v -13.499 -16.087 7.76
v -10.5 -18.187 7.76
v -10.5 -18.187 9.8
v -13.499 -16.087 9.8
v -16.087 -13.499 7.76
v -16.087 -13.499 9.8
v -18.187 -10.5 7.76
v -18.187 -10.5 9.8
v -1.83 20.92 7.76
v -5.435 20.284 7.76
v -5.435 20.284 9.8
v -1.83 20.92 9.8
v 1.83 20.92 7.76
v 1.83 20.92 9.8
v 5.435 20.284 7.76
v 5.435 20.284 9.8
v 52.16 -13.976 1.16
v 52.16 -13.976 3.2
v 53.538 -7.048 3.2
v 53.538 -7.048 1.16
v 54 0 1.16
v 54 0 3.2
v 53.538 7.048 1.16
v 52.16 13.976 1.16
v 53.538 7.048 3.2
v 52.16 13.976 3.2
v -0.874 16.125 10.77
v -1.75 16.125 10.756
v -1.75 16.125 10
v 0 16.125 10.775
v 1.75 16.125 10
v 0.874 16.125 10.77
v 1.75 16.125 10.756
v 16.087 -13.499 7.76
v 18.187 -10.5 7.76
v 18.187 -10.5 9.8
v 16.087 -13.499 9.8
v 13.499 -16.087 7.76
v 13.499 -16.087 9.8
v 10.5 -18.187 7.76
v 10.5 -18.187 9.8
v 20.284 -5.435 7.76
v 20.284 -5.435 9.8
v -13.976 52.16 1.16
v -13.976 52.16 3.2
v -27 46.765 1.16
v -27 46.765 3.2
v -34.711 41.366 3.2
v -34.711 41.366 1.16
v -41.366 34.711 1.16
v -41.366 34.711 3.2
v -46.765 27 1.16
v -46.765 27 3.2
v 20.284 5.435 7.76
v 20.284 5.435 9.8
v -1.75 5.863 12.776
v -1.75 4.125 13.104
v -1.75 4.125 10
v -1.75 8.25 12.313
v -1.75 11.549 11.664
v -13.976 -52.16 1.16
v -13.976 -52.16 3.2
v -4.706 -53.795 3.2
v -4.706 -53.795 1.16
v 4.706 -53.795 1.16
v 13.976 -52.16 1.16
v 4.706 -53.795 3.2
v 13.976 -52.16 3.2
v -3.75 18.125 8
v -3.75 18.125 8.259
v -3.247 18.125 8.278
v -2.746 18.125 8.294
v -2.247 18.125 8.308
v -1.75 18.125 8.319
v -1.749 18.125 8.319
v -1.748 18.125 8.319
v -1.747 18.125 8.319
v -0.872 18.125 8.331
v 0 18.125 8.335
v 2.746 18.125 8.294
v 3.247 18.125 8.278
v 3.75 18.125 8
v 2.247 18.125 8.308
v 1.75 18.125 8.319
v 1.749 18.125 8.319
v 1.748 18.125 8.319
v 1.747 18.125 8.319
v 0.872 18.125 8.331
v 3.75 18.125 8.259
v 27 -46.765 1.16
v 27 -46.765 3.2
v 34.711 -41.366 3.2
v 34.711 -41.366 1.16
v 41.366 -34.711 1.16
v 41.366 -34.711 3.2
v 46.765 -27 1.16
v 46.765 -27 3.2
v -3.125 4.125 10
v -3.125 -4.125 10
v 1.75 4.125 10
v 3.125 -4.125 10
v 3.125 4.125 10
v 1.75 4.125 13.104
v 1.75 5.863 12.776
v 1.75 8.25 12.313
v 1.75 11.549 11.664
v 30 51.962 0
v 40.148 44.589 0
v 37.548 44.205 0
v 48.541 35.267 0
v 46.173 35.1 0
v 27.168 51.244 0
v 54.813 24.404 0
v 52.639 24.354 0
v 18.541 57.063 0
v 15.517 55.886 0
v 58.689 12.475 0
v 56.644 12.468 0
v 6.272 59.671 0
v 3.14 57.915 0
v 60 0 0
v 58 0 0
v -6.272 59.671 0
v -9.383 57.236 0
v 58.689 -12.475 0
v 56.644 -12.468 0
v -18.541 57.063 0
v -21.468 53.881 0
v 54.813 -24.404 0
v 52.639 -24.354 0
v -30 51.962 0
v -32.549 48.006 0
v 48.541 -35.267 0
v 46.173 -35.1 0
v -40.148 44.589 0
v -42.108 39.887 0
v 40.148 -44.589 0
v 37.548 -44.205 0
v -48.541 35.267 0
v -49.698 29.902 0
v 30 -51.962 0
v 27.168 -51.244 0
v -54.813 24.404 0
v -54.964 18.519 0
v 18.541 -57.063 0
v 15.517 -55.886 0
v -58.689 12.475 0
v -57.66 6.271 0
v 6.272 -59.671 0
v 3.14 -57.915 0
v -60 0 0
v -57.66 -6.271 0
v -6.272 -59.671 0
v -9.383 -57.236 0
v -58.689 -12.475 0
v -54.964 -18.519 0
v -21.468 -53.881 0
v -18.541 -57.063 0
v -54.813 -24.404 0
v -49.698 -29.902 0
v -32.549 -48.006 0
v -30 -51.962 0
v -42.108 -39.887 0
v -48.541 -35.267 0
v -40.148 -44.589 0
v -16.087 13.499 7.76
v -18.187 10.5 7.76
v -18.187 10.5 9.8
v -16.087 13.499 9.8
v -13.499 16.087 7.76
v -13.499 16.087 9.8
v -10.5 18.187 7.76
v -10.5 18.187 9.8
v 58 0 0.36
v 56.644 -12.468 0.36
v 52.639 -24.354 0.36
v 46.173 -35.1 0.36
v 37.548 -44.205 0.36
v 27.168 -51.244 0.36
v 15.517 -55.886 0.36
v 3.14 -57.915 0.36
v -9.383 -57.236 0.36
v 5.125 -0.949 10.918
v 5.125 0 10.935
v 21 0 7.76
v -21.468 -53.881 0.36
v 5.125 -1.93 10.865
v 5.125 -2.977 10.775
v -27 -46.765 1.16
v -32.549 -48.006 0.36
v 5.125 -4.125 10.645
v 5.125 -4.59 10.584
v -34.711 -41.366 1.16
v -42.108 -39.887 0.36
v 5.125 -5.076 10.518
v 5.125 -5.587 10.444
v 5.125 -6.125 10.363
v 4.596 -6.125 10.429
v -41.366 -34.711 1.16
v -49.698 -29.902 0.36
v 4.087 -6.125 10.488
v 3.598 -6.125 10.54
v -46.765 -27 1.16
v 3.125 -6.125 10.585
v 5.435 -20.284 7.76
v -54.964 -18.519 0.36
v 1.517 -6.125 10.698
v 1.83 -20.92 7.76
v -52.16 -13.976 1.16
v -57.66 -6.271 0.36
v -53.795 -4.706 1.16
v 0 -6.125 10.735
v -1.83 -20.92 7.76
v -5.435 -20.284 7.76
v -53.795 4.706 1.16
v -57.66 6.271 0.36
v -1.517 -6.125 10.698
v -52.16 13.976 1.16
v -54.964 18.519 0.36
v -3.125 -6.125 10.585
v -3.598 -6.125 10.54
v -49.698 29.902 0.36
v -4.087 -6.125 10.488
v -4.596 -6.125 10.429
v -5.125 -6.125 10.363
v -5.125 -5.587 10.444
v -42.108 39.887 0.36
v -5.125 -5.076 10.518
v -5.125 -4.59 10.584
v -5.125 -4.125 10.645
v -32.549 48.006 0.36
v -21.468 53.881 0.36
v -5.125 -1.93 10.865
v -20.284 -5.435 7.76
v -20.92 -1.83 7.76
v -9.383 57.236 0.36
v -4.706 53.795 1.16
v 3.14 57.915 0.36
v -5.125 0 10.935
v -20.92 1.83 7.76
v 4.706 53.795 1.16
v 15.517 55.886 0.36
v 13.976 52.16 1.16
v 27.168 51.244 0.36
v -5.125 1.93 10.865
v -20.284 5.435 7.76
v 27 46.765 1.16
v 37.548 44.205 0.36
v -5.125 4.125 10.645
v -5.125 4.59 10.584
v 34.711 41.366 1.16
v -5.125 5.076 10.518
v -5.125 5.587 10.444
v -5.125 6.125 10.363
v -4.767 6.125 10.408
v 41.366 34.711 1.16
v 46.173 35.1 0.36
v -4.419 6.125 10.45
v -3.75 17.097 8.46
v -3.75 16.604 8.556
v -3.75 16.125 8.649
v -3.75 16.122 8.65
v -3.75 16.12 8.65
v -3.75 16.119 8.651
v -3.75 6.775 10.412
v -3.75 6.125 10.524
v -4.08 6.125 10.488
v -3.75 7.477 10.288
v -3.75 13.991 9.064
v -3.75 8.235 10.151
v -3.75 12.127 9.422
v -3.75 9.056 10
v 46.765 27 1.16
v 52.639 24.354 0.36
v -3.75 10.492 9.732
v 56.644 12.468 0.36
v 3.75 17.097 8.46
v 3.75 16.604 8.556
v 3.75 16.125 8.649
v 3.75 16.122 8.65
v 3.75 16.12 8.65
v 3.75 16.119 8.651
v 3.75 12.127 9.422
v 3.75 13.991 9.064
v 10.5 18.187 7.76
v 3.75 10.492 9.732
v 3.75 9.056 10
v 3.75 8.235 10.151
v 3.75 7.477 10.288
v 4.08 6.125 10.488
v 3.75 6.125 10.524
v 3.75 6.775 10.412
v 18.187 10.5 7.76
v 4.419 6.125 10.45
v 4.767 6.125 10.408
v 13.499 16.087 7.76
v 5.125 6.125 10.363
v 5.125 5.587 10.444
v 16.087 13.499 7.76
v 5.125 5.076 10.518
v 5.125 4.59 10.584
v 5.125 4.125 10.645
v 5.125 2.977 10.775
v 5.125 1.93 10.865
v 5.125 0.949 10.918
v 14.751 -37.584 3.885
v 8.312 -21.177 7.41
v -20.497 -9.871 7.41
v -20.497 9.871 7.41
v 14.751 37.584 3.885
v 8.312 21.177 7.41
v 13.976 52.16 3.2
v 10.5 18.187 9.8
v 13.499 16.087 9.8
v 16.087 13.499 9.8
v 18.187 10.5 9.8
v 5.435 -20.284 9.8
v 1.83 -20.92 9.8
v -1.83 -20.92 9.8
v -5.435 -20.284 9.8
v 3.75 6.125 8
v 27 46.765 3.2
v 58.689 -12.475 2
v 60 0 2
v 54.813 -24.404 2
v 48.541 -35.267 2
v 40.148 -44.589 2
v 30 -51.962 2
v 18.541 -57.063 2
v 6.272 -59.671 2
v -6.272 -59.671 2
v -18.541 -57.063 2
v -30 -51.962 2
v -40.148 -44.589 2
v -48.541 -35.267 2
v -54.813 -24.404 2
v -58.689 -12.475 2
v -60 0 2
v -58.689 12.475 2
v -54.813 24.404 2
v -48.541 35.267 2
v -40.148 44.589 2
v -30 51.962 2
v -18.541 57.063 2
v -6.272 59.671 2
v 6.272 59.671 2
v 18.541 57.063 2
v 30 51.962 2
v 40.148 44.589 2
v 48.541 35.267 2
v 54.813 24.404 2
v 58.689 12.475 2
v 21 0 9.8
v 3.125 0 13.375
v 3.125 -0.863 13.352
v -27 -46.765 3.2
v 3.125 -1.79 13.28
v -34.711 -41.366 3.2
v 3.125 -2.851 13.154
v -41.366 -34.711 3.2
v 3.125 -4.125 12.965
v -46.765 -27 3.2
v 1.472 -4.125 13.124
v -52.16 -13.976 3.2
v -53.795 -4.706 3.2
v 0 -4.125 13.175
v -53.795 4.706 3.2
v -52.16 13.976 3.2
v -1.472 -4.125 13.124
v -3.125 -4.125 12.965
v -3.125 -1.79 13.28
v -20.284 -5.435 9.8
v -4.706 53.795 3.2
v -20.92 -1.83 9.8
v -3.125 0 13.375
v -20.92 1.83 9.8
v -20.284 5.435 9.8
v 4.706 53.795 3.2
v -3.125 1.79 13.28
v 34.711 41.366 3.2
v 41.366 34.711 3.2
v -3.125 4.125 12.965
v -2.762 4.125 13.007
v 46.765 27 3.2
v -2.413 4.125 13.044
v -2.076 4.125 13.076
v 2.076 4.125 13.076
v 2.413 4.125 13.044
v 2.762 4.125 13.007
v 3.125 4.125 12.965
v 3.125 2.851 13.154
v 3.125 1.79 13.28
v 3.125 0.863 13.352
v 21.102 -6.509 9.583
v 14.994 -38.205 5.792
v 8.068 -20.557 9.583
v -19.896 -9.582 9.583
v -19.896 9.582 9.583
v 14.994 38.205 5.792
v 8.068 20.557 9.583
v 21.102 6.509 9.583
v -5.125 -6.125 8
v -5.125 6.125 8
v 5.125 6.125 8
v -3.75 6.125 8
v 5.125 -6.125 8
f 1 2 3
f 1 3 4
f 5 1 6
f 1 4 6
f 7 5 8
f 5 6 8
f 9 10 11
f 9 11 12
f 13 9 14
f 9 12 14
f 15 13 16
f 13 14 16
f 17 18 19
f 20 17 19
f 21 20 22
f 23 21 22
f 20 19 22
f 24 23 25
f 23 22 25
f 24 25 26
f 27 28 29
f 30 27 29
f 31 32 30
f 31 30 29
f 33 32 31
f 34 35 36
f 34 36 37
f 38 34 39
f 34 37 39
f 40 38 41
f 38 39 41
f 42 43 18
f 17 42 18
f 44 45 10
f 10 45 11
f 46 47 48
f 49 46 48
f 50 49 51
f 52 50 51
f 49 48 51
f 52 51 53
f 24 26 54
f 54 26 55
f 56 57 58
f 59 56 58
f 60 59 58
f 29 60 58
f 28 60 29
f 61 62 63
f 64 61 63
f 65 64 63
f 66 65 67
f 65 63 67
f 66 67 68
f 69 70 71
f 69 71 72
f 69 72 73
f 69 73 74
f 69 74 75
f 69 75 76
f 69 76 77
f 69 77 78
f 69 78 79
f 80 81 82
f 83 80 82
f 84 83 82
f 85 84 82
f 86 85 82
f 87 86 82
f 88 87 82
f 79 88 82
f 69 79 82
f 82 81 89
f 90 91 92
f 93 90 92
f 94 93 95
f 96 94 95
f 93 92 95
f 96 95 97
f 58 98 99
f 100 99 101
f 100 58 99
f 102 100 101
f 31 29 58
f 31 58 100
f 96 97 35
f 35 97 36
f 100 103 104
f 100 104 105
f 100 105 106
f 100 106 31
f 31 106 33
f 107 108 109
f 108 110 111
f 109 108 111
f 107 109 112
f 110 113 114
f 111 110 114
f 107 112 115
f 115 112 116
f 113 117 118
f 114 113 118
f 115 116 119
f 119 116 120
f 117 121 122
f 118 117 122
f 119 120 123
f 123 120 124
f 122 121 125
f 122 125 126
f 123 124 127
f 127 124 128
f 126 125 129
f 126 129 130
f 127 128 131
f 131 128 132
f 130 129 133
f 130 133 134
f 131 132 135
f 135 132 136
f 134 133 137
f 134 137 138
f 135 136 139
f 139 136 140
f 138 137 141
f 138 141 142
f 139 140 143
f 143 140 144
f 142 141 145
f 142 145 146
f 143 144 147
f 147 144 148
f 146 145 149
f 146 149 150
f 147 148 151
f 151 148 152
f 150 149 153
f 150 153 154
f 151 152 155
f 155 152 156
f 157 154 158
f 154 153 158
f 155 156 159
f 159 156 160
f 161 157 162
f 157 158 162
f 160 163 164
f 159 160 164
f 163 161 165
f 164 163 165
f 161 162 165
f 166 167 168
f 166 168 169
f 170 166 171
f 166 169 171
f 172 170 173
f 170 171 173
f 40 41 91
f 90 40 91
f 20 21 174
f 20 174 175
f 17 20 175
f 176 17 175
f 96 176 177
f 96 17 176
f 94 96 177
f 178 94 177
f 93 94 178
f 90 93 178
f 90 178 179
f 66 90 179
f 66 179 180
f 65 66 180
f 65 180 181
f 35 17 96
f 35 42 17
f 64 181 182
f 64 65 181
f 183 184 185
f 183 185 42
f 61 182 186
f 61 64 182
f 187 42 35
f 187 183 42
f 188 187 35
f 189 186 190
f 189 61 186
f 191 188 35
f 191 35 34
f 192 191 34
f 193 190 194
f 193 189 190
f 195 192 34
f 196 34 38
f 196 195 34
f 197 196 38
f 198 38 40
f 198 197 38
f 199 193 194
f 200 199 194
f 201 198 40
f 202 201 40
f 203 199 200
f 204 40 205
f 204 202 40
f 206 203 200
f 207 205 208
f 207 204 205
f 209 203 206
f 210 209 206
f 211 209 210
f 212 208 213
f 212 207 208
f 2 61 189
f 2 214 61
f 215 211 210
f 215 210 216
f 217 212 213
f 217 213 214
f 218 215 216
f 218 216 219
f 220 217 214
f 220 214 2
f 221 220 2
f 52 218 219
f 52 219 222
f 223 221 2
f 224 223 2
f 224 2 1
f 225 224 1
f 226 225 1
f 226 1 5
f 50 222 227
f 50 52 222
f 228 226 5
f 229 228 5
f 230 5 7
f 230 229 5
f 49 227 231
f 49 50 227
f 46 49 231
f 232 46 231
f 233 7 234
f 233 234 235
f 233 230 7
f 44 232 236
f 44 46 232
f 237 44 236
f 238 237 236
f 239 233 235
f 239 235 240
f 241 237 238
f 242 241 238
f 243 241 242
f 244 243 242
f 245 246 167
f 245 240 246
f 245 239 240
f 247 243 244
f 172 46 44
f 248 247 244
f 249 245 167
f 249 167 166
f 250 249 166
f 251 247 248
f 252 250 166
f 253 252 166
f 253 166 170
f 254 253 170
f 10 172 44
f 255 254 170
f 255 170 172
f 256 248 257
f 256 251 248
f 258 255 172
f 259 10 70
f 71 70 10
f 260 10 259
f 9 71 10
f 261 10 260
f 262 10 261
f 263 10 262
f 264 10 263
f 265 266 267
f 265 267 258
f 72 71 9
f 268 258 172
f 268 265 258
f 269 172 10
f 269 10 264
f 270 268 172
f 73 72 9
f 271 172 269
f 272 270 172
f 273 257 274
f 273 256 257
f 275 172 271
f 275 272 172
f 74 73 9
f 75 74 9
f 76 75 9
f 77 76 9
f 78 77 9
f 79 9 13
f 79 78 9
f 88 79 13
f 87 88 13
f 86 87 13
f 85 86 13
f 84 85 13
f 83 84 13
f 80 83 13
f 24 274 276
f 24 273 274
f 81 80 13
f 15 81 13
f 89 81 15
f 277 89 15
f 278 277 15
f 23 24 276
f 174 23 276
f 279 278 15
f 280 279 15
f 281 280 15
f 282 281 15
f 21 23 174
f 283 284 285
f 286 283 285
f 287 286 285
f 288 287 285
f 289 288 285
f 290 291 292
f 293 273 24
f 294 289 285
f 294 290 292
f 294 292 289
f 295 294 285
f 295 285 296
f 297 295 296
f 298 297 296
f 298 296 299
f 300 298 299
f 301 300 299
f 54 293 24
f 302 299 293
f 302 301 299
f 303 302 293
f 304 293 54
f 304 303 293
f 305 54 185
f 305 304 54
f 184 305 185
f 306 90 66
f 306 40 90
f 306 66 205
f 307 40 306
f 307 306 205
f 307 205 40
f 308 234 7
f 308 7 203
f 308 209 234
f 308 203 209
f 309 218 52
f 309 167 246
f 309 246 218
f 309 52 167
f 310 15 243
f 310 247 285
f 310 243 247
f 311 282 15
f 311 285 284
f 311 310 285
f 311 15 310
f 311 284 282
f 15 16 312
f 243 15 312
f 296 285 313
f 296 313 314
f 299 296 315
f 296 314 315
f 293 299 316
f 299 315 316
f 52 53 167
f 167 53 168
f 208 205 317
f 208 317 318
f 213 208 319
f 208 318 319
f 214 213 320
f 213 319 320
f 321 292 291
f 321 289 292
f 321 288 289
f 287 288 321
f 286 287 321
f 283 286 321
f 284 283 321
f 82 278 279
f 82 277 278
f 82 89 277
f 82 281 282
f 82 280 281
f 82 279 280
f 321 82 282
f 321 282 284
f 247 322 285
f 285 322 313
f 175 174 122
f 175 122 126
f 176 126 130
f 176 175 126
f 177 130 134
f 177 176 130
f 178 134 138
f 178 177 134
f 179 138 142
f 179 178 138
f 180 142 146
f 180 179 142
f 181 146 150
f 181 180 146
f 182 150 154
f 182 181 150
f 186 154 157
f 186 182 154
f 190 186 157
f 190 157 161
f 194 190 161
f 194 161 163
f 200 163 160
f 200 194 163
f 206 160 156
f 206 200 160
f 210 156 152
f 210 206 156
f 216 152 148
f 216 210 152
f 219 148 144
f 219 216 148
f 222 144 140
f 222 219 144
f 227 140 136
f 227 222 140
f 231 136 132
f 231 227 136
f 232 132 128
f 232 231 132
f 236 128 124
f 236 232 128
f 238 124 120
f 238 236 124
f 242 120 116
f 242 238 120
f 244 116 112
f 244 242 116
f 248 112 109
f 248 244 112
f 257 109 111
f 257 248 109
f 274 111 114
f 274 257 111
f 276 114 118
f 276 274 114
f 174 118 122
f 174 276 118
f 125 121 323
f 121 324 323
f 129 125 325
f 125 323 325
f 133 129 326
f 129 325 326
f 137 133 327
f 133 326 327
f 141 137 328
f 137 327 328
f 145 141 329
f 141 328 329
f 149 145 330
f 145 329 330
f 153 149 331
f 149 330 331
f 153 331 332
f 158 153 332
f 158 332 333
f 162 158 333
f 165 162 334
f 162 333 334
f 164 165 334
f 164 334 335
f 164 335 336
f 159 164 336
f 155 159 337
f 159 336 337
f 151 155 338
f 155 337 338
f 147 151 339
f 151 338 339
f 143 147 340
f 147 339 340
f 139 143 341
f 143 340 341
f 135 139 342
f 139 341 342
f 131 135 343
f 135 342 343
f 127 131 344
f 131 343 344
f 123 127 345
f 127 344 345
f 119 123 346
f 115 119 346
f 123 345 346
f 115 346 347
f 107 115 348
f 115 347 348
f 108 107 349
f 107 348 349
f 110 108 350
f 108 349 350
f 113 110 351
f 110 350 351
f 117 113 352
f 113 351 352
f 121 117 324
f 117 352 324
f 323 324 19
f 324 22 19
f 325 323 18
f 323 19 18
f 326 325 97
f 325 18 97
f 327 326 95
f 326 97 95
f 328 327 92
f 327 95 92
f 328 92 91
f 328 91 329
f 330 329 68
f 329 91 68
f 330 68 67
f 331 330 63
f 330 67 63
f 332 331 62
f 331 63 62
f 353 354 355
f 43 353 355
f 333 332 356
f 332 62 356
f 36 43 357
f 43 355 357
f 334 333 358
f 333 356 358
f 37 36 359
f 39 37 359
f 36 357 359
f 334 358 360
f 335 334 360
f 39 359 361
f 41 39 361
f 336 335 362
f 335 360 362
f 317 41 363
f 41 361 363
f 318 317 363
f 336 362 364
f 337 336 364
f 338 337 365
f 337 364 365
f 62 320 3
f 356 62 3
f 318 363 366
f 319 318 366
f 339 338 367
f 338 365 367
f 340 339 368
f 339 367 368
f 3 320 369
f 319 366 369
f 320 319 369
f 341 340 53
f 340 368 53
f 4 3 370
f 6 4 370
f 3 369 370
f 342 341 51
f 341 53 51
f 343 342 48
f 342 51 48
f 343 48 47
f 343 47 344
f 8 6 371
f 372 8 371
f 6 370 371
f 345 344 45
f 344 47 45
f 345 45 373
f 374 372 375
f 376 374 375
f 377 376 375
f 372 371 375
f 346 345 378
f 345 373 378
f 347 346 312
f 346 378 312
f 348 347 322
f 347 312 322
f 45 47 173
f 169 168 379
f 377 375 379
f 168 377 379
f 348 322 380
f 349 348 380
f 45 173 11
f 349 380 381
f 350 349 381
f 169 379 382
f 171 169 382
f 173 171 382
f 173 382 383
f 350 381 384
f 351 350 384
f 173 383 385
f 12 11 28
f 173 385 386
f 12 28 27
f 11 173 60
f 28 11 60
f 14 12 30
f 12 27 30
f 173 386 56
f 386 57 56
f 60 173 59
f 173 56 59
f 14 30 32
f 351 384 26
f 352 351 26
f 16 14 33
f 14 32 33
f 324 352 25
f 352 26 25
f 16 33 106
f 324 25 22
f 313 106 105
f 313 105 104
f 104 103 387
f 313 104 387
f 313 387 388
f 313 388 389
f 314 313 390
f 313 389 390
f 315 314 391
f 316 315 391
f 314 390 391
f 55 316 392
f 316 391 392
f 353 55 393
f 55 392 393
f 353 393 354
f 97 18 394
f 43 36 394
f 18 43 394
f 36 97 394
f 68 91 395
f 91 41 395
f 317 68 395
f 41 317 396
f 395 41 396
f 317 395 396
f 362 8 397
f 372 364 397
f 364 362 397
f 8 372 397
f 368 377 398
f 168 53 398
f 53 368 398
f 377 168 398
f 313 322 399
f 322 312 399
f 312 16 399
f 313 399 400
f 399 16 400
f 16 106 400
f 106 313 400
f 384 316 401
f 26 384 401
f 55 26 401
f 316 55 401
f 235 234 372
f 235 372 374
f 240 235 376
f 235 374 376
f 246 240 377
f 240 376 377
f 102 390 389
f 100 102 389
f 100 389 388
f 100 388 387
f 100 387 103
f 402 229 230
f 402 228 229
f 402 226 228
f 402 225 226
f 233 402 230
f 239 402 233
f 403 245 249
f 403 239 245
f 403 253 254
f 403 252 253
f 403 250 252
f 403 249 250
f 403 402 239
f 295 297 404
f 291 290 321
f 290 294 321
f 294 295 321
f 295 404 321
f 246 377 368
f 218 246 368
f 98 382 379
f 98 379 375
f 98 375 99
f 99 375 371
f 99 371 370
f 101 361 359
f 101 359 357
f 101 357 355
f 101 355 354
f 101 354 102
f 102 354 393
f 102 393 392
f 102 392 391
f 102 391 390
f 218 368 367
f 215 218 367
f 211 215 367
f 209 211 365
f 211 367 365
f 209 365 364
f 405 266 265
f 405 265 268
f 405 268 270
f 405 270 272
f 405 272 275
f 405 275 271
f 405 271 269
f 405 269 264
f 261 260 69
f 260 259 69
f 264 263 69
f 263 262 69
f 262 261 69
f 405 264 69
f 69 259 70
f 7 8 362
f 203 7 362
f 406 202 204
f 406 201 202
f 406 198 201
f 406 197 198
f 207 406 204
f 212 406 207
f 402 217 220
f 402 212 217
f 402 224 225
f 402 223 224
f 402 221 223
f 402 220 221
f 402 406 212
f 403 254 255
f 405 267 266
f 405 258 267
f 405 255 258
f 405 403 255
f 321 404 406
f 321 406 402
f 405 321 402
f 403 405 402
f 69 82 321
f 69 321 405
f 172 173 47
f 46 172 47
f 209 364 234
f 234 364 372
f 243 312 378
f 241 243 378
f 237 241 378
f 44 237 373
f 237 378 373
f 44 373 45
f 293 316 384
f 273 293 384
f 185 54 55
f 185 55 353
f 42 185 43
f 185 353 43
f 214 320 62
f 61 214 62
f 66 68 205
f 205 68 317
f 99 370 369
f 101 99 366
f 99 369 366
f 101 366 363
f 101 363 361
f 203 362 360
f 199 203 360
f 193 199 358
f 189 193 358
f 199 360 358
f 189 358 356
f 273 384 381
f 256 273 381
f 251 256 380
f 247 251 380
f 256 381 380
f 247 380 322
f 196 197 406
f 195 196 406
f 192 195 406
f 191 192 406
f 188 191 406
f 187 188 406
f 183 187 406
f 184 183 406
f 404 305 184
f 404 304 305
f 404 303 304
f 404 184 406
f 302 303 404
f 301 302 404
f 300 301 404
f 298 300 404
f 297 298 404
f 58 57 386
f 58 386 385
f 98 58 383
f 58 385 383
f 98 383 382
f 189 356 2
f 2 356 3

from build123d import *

# Parameters (mm, degrees)
F3_W         = 3.5
F3_H         = 12
F4_DEPTH     = 4
F5_T         = 2
F5_T3_DEPTH  = 6.9649879228
F5_T5_DEPTH  = 12.25
F5_T7_DEPTH  = 10.25
F5_T9_DEPTH  = 5.375
F5_T11_DEPTH = 16
F5_T13_DEPTH = 4.7560633483
F5_T15_DEPTH = 7.5
F5_T17_DEPTH = 5.375
F7_DEPTH     = 25


# Not quite as in the source:
# - a shell that OpenCascade refuses in one call is made with other operations: the cavity is built on its own and cut out


with BuildPart() as f1:
    # F0 (on Front) → F1 (revolve)
    with BuildSketch(Plane.XZ):
        Polygon((60, 2), (0, 14), (0, 0), (60, 0), align=None)
    revolve(axis=Axis((0, 0, 7), (0, 0, -1)))

    # F3 (on offset) → F4 (cut)
    with BuildSketch(Plane.XY.offset(14)):
        Polygon((3.125, -4.125), (3.125, 4.125), (1.75, 4.125), (-1.75, 4.125), (-3.125, 4.125), (-3.125, -4.125), align=None)
        with Locations((0, 10.125)):
            Rectangle(F3_W, F3_H)
    extrude(amount=-F4_DEPTH, mode=Mode.SUBTRACT)

    # F5: shell of thickness 2, made by hand


with BuildPart() as f5_core1:
    # F5_t2: copy of F1
    add(f1.part)

    # the walls: a layer under each face that stays
    f5_faces = [f5_core1.faces().sort_by_distance(p)[0] for p in [
        (-31.5412459886, 0, 7.6917508023),
        (3.125, 0, 11.6875),
        (0, -4.125, 11.5875),
        (-3.125, 0, 11.6875),
        (-2.4375, 4.125, 11.5519137918),
        (-1.75, 10.125, 11.5519137918),
        (0, 16.125, 10.3875),
        (1.75, 10.125, 11.5519137918),
        (2.4375, 4.125, 11.5519137918),
        (-60, 0, 1),
        (0, 6, 10),
    ]]
    thicken(f5_faces, amount=-F5_T, mode=Mode.SUBTRACT)

    # F5_s4 → F5_t3 (cut)
    with BuildSketch(Plane.XY.offset(8)):
        Polygon((3.105, 4.105), (5.125, 4.125), (5.125, 6.125), (3.125, 6.125), align=None)
        Polygon((3.105, -4.105), (5.125, -4.125), (5.125, -6.125), (3.125, -6.125), align=None)
        Polygon((-3.105, -4.105), (-3.125, -6.125), (-5.125, -6.125), (-5.125, -4.125), align=None)
        Polygon((-3.105, 4.105), (-5.125, 4.125), (-5.125, 6.125), (-3.125, 6.125), align=None)
    extrude(amount=F5_T3_DEPTH, mode=Mode.SUBTRACT)

    # F5_s6 → F5_t5 (cut)
    with BuildSketch(Plane.XZ.offset(-6.125)):
        Polygon((3.105, 10.02), (5.125, 10), (5.125, 8), (3.125, 8), align=None)
        Polygon((-3.105, 10.02), (-5.125, 10), (-5.125, 8), (-3.125, 8), align=None)
    extrude(amount=F5_T5_DEPTH, mode=Mode.SUBTRACT)

    # F5_s8 → F5_t7 (cut)
    with BuildSketch(Plane.YZ.offset(-5.125)):
        Polygon((-4.105, 10.02), (-6.125, 10), (-6.125, 8), (-4.125, 8), align=None)
    extrude(amount=F5_T7_DEPTH, mode=Mode.SUBTRACT)

    # F5_s10 → F5_t9 (cut)
    with BuildSketch(Plane.YZ.offset(-5.125)):
        Polygon((4.105, 10.02), (6.125, 10), (6.125, 8), (4.125, 8), align=None)
    extrude(amount=F5_T9_DEPTH, mode=Mode.SUBTRACT)

    # F5_s12 → F5_t11 (cut)
    with BuildSketch(Plane.XZ.offset(-18.125)):
        Polygon((-1.73, 10.02), (-3.75, 10), (-3.75, 8), (-1.75, 8), align=None)
        Polygon((1.73, 10.02), (3.75, 10), (3.75, 8), (1.75, 8), align=None)
    extrude(amount=F5_T11_DEPTH, mode=Mode.SUBTRACT)

    # F5_s14 → F5_t13 (cut)
    with BuildSketch(Plane.XY.offset(8)):
        Polygon((-1.73, 16.105), (-3.75, 16.125), (-3.75, 18.125), (-1.75, 18.125), align=None)
        Polygon((1.73, 16.105), (1.75, 18.125), (3.75, 18.125), (3.75, 16.125), align=None)
    extrude(amount=F5_T13_DEPTH, mode=Mode.SUBTRACT)

    # F5_s16 → F5_t15 (cut)
    with BuildSketch(Plane.YZ.offset(-3.75)):
        Polygon((16.105, 10.02), (18.125, 10), (18.125, 8), (16.125, 8), align=None)
    extrude(amount=F5_T15_DEPTH, mode=Mode.SUBTRACT)

    # F5_s18 → F5_t17 (cut)
    with BuildSketch(Plane.YZ.offset(-0.25)):
        Polygon((4.105, 10.02), (6.125, 10), (6.125, 8), (4.125, 8), align=None)
    extrude(amount=F5_T17_DEPTH, mode=Mode.SUBTRACT)


with BuildPart() as f1_1:
    add(f1.part)

    # what is left inside the walls is the cavity
    f5_cavity = [f5_core1.part.solids().sort_by_distance(p)[0] for p in [
        (0, 19.333333, 0.02),
    ]]
    add(f5_cavity, mode=Mode.SUBTRACT)

    # F6 (on offset) → F7 (cut)
    with BuildSketch(Plane.XY.offset(14)):
        with BuildLine():
            ThreePointArc((5.4351999472, -20.2844423521), (0, -21), (-5.4351999472, -20.2844423521))
            Line((-5.4351999472, -20.2844423521), (-13.9762284355, -52.1599946196))
            ThreePointArc((-13.9762284355, -52.1599946196), (0, -54), (13.9762284355, -52.1599946196))
            Line((13.9762284355, -52.1599946196), (5.4351999472, -20.2844423521))
        make_face()
        with BuildLine():
            ThreePointArc((18.1865334795, -10.5), (14.8492424049, -14.8492424049), (10.5, -18.1865334795))
            Line((10.5, -18.1865334795), (27, -46.7653718044))
            ThreePointArc((27, -46.7653718044), (38.1837661841, -38.1837661841), (46.7653718044, -27))
            Line((46.7653718044, -27), (18.1865334795, -10.5))
        make_face()
        with BuildLine():
            ThreePointArc((20.2844423521, 5.4351999472), (21, 0), (20.2844423521, -5.4351999472))
            Line((20.2844423521, -5.4351999472), (52.1599946196, -13.9762284355))
            ThreePointArc((52.1599946196, -13.9762284355), (54, 0), (52.1599946196, 13.9762284355))
            Line((52.1599946196, 13.9762284355), (20.2844423521, 5.4351999472))
        make_face()
        with BuildLine():
            ThreePointArc((10.5, 18.1865334795), (14.8492424049, 14.8492424049), (18.1865334795, 10.5))
            Line((18.1865334795, 10.5), (46.7653718044, 27))
            ThreePointArc((46.7653718044, 27), (38.1837661841, 38.1837661841), (27, 46.7653718044))
            Line((27, 46.7653718044), (10.5, 18.1865334795))
        make_face()
        with BuildLine():
            ThreePointArc((-5.4351999472, 20.2844423521), (0, 21), (5.4351999472, 20.2844423521))
            Line((5.4351999472, 20.2844423521), (13.9762284355, 52.1599946196))
            ThreePointArc((13.9762284355, 52.1599946196), (0, 54), (-13.9762284355, 52.1599946196))
            Line((-13.9762284355, 52.1599946196), (-5.4351999472, 20.2844423521))
        make_face()
        with BuildLine():
            ThreePointArc((-18.1865334795, 10.5), (-14.8492424049, 14.8492424049), (-10.5, 18.1865334795))
            Line((-10.5, 18.1865334795), (-27, 46.7653718044))
            ThreePointArc((-27, 46.7653718044), (-38.1837661841, 38.1837661841), (-46.7653718044, 27))
            Line((-46.7653718044, 27), (-18.1865334795, 10.5))
        make_face()
        with BuildLine():
            ThreePointArc((-20.2844423521, -5.4351999472), (-21, 0), (-20.2844423521, 5.4351999472))
            Line((-20.2844423521, 5.4351999472), (-52.1599946196, 13.9762284355))
            ThreePointArc((-52.1599946196, 13.9762284355), (-54, 0), (-52.1599946196, -13.9762284355))
            Line((-52.1599946196, -13.9762284355), (-20.2844423521, -5.4351999472))
        make_face()
        with BuildLine():
            ThreePointArc((-10.5, -18.1865334795), (-14.8492424049, -14.8492424049), (-18.1865334795, -10.5))
            Line((-18.1865334795, -10.5), (-46.7653718044, -27))
            ThreePointArc((-46.7653718044, -27), (-38.1837661841, -38.1837661841), (-27, -46.7653718044))
            Line((-27, -46.7653718044), (-10.5, -18.1865334795))
        make_face()
    extrude(amount=-F7_DEPTH, mode=Mode.SUBTRACT)


solid = f1_1.part
